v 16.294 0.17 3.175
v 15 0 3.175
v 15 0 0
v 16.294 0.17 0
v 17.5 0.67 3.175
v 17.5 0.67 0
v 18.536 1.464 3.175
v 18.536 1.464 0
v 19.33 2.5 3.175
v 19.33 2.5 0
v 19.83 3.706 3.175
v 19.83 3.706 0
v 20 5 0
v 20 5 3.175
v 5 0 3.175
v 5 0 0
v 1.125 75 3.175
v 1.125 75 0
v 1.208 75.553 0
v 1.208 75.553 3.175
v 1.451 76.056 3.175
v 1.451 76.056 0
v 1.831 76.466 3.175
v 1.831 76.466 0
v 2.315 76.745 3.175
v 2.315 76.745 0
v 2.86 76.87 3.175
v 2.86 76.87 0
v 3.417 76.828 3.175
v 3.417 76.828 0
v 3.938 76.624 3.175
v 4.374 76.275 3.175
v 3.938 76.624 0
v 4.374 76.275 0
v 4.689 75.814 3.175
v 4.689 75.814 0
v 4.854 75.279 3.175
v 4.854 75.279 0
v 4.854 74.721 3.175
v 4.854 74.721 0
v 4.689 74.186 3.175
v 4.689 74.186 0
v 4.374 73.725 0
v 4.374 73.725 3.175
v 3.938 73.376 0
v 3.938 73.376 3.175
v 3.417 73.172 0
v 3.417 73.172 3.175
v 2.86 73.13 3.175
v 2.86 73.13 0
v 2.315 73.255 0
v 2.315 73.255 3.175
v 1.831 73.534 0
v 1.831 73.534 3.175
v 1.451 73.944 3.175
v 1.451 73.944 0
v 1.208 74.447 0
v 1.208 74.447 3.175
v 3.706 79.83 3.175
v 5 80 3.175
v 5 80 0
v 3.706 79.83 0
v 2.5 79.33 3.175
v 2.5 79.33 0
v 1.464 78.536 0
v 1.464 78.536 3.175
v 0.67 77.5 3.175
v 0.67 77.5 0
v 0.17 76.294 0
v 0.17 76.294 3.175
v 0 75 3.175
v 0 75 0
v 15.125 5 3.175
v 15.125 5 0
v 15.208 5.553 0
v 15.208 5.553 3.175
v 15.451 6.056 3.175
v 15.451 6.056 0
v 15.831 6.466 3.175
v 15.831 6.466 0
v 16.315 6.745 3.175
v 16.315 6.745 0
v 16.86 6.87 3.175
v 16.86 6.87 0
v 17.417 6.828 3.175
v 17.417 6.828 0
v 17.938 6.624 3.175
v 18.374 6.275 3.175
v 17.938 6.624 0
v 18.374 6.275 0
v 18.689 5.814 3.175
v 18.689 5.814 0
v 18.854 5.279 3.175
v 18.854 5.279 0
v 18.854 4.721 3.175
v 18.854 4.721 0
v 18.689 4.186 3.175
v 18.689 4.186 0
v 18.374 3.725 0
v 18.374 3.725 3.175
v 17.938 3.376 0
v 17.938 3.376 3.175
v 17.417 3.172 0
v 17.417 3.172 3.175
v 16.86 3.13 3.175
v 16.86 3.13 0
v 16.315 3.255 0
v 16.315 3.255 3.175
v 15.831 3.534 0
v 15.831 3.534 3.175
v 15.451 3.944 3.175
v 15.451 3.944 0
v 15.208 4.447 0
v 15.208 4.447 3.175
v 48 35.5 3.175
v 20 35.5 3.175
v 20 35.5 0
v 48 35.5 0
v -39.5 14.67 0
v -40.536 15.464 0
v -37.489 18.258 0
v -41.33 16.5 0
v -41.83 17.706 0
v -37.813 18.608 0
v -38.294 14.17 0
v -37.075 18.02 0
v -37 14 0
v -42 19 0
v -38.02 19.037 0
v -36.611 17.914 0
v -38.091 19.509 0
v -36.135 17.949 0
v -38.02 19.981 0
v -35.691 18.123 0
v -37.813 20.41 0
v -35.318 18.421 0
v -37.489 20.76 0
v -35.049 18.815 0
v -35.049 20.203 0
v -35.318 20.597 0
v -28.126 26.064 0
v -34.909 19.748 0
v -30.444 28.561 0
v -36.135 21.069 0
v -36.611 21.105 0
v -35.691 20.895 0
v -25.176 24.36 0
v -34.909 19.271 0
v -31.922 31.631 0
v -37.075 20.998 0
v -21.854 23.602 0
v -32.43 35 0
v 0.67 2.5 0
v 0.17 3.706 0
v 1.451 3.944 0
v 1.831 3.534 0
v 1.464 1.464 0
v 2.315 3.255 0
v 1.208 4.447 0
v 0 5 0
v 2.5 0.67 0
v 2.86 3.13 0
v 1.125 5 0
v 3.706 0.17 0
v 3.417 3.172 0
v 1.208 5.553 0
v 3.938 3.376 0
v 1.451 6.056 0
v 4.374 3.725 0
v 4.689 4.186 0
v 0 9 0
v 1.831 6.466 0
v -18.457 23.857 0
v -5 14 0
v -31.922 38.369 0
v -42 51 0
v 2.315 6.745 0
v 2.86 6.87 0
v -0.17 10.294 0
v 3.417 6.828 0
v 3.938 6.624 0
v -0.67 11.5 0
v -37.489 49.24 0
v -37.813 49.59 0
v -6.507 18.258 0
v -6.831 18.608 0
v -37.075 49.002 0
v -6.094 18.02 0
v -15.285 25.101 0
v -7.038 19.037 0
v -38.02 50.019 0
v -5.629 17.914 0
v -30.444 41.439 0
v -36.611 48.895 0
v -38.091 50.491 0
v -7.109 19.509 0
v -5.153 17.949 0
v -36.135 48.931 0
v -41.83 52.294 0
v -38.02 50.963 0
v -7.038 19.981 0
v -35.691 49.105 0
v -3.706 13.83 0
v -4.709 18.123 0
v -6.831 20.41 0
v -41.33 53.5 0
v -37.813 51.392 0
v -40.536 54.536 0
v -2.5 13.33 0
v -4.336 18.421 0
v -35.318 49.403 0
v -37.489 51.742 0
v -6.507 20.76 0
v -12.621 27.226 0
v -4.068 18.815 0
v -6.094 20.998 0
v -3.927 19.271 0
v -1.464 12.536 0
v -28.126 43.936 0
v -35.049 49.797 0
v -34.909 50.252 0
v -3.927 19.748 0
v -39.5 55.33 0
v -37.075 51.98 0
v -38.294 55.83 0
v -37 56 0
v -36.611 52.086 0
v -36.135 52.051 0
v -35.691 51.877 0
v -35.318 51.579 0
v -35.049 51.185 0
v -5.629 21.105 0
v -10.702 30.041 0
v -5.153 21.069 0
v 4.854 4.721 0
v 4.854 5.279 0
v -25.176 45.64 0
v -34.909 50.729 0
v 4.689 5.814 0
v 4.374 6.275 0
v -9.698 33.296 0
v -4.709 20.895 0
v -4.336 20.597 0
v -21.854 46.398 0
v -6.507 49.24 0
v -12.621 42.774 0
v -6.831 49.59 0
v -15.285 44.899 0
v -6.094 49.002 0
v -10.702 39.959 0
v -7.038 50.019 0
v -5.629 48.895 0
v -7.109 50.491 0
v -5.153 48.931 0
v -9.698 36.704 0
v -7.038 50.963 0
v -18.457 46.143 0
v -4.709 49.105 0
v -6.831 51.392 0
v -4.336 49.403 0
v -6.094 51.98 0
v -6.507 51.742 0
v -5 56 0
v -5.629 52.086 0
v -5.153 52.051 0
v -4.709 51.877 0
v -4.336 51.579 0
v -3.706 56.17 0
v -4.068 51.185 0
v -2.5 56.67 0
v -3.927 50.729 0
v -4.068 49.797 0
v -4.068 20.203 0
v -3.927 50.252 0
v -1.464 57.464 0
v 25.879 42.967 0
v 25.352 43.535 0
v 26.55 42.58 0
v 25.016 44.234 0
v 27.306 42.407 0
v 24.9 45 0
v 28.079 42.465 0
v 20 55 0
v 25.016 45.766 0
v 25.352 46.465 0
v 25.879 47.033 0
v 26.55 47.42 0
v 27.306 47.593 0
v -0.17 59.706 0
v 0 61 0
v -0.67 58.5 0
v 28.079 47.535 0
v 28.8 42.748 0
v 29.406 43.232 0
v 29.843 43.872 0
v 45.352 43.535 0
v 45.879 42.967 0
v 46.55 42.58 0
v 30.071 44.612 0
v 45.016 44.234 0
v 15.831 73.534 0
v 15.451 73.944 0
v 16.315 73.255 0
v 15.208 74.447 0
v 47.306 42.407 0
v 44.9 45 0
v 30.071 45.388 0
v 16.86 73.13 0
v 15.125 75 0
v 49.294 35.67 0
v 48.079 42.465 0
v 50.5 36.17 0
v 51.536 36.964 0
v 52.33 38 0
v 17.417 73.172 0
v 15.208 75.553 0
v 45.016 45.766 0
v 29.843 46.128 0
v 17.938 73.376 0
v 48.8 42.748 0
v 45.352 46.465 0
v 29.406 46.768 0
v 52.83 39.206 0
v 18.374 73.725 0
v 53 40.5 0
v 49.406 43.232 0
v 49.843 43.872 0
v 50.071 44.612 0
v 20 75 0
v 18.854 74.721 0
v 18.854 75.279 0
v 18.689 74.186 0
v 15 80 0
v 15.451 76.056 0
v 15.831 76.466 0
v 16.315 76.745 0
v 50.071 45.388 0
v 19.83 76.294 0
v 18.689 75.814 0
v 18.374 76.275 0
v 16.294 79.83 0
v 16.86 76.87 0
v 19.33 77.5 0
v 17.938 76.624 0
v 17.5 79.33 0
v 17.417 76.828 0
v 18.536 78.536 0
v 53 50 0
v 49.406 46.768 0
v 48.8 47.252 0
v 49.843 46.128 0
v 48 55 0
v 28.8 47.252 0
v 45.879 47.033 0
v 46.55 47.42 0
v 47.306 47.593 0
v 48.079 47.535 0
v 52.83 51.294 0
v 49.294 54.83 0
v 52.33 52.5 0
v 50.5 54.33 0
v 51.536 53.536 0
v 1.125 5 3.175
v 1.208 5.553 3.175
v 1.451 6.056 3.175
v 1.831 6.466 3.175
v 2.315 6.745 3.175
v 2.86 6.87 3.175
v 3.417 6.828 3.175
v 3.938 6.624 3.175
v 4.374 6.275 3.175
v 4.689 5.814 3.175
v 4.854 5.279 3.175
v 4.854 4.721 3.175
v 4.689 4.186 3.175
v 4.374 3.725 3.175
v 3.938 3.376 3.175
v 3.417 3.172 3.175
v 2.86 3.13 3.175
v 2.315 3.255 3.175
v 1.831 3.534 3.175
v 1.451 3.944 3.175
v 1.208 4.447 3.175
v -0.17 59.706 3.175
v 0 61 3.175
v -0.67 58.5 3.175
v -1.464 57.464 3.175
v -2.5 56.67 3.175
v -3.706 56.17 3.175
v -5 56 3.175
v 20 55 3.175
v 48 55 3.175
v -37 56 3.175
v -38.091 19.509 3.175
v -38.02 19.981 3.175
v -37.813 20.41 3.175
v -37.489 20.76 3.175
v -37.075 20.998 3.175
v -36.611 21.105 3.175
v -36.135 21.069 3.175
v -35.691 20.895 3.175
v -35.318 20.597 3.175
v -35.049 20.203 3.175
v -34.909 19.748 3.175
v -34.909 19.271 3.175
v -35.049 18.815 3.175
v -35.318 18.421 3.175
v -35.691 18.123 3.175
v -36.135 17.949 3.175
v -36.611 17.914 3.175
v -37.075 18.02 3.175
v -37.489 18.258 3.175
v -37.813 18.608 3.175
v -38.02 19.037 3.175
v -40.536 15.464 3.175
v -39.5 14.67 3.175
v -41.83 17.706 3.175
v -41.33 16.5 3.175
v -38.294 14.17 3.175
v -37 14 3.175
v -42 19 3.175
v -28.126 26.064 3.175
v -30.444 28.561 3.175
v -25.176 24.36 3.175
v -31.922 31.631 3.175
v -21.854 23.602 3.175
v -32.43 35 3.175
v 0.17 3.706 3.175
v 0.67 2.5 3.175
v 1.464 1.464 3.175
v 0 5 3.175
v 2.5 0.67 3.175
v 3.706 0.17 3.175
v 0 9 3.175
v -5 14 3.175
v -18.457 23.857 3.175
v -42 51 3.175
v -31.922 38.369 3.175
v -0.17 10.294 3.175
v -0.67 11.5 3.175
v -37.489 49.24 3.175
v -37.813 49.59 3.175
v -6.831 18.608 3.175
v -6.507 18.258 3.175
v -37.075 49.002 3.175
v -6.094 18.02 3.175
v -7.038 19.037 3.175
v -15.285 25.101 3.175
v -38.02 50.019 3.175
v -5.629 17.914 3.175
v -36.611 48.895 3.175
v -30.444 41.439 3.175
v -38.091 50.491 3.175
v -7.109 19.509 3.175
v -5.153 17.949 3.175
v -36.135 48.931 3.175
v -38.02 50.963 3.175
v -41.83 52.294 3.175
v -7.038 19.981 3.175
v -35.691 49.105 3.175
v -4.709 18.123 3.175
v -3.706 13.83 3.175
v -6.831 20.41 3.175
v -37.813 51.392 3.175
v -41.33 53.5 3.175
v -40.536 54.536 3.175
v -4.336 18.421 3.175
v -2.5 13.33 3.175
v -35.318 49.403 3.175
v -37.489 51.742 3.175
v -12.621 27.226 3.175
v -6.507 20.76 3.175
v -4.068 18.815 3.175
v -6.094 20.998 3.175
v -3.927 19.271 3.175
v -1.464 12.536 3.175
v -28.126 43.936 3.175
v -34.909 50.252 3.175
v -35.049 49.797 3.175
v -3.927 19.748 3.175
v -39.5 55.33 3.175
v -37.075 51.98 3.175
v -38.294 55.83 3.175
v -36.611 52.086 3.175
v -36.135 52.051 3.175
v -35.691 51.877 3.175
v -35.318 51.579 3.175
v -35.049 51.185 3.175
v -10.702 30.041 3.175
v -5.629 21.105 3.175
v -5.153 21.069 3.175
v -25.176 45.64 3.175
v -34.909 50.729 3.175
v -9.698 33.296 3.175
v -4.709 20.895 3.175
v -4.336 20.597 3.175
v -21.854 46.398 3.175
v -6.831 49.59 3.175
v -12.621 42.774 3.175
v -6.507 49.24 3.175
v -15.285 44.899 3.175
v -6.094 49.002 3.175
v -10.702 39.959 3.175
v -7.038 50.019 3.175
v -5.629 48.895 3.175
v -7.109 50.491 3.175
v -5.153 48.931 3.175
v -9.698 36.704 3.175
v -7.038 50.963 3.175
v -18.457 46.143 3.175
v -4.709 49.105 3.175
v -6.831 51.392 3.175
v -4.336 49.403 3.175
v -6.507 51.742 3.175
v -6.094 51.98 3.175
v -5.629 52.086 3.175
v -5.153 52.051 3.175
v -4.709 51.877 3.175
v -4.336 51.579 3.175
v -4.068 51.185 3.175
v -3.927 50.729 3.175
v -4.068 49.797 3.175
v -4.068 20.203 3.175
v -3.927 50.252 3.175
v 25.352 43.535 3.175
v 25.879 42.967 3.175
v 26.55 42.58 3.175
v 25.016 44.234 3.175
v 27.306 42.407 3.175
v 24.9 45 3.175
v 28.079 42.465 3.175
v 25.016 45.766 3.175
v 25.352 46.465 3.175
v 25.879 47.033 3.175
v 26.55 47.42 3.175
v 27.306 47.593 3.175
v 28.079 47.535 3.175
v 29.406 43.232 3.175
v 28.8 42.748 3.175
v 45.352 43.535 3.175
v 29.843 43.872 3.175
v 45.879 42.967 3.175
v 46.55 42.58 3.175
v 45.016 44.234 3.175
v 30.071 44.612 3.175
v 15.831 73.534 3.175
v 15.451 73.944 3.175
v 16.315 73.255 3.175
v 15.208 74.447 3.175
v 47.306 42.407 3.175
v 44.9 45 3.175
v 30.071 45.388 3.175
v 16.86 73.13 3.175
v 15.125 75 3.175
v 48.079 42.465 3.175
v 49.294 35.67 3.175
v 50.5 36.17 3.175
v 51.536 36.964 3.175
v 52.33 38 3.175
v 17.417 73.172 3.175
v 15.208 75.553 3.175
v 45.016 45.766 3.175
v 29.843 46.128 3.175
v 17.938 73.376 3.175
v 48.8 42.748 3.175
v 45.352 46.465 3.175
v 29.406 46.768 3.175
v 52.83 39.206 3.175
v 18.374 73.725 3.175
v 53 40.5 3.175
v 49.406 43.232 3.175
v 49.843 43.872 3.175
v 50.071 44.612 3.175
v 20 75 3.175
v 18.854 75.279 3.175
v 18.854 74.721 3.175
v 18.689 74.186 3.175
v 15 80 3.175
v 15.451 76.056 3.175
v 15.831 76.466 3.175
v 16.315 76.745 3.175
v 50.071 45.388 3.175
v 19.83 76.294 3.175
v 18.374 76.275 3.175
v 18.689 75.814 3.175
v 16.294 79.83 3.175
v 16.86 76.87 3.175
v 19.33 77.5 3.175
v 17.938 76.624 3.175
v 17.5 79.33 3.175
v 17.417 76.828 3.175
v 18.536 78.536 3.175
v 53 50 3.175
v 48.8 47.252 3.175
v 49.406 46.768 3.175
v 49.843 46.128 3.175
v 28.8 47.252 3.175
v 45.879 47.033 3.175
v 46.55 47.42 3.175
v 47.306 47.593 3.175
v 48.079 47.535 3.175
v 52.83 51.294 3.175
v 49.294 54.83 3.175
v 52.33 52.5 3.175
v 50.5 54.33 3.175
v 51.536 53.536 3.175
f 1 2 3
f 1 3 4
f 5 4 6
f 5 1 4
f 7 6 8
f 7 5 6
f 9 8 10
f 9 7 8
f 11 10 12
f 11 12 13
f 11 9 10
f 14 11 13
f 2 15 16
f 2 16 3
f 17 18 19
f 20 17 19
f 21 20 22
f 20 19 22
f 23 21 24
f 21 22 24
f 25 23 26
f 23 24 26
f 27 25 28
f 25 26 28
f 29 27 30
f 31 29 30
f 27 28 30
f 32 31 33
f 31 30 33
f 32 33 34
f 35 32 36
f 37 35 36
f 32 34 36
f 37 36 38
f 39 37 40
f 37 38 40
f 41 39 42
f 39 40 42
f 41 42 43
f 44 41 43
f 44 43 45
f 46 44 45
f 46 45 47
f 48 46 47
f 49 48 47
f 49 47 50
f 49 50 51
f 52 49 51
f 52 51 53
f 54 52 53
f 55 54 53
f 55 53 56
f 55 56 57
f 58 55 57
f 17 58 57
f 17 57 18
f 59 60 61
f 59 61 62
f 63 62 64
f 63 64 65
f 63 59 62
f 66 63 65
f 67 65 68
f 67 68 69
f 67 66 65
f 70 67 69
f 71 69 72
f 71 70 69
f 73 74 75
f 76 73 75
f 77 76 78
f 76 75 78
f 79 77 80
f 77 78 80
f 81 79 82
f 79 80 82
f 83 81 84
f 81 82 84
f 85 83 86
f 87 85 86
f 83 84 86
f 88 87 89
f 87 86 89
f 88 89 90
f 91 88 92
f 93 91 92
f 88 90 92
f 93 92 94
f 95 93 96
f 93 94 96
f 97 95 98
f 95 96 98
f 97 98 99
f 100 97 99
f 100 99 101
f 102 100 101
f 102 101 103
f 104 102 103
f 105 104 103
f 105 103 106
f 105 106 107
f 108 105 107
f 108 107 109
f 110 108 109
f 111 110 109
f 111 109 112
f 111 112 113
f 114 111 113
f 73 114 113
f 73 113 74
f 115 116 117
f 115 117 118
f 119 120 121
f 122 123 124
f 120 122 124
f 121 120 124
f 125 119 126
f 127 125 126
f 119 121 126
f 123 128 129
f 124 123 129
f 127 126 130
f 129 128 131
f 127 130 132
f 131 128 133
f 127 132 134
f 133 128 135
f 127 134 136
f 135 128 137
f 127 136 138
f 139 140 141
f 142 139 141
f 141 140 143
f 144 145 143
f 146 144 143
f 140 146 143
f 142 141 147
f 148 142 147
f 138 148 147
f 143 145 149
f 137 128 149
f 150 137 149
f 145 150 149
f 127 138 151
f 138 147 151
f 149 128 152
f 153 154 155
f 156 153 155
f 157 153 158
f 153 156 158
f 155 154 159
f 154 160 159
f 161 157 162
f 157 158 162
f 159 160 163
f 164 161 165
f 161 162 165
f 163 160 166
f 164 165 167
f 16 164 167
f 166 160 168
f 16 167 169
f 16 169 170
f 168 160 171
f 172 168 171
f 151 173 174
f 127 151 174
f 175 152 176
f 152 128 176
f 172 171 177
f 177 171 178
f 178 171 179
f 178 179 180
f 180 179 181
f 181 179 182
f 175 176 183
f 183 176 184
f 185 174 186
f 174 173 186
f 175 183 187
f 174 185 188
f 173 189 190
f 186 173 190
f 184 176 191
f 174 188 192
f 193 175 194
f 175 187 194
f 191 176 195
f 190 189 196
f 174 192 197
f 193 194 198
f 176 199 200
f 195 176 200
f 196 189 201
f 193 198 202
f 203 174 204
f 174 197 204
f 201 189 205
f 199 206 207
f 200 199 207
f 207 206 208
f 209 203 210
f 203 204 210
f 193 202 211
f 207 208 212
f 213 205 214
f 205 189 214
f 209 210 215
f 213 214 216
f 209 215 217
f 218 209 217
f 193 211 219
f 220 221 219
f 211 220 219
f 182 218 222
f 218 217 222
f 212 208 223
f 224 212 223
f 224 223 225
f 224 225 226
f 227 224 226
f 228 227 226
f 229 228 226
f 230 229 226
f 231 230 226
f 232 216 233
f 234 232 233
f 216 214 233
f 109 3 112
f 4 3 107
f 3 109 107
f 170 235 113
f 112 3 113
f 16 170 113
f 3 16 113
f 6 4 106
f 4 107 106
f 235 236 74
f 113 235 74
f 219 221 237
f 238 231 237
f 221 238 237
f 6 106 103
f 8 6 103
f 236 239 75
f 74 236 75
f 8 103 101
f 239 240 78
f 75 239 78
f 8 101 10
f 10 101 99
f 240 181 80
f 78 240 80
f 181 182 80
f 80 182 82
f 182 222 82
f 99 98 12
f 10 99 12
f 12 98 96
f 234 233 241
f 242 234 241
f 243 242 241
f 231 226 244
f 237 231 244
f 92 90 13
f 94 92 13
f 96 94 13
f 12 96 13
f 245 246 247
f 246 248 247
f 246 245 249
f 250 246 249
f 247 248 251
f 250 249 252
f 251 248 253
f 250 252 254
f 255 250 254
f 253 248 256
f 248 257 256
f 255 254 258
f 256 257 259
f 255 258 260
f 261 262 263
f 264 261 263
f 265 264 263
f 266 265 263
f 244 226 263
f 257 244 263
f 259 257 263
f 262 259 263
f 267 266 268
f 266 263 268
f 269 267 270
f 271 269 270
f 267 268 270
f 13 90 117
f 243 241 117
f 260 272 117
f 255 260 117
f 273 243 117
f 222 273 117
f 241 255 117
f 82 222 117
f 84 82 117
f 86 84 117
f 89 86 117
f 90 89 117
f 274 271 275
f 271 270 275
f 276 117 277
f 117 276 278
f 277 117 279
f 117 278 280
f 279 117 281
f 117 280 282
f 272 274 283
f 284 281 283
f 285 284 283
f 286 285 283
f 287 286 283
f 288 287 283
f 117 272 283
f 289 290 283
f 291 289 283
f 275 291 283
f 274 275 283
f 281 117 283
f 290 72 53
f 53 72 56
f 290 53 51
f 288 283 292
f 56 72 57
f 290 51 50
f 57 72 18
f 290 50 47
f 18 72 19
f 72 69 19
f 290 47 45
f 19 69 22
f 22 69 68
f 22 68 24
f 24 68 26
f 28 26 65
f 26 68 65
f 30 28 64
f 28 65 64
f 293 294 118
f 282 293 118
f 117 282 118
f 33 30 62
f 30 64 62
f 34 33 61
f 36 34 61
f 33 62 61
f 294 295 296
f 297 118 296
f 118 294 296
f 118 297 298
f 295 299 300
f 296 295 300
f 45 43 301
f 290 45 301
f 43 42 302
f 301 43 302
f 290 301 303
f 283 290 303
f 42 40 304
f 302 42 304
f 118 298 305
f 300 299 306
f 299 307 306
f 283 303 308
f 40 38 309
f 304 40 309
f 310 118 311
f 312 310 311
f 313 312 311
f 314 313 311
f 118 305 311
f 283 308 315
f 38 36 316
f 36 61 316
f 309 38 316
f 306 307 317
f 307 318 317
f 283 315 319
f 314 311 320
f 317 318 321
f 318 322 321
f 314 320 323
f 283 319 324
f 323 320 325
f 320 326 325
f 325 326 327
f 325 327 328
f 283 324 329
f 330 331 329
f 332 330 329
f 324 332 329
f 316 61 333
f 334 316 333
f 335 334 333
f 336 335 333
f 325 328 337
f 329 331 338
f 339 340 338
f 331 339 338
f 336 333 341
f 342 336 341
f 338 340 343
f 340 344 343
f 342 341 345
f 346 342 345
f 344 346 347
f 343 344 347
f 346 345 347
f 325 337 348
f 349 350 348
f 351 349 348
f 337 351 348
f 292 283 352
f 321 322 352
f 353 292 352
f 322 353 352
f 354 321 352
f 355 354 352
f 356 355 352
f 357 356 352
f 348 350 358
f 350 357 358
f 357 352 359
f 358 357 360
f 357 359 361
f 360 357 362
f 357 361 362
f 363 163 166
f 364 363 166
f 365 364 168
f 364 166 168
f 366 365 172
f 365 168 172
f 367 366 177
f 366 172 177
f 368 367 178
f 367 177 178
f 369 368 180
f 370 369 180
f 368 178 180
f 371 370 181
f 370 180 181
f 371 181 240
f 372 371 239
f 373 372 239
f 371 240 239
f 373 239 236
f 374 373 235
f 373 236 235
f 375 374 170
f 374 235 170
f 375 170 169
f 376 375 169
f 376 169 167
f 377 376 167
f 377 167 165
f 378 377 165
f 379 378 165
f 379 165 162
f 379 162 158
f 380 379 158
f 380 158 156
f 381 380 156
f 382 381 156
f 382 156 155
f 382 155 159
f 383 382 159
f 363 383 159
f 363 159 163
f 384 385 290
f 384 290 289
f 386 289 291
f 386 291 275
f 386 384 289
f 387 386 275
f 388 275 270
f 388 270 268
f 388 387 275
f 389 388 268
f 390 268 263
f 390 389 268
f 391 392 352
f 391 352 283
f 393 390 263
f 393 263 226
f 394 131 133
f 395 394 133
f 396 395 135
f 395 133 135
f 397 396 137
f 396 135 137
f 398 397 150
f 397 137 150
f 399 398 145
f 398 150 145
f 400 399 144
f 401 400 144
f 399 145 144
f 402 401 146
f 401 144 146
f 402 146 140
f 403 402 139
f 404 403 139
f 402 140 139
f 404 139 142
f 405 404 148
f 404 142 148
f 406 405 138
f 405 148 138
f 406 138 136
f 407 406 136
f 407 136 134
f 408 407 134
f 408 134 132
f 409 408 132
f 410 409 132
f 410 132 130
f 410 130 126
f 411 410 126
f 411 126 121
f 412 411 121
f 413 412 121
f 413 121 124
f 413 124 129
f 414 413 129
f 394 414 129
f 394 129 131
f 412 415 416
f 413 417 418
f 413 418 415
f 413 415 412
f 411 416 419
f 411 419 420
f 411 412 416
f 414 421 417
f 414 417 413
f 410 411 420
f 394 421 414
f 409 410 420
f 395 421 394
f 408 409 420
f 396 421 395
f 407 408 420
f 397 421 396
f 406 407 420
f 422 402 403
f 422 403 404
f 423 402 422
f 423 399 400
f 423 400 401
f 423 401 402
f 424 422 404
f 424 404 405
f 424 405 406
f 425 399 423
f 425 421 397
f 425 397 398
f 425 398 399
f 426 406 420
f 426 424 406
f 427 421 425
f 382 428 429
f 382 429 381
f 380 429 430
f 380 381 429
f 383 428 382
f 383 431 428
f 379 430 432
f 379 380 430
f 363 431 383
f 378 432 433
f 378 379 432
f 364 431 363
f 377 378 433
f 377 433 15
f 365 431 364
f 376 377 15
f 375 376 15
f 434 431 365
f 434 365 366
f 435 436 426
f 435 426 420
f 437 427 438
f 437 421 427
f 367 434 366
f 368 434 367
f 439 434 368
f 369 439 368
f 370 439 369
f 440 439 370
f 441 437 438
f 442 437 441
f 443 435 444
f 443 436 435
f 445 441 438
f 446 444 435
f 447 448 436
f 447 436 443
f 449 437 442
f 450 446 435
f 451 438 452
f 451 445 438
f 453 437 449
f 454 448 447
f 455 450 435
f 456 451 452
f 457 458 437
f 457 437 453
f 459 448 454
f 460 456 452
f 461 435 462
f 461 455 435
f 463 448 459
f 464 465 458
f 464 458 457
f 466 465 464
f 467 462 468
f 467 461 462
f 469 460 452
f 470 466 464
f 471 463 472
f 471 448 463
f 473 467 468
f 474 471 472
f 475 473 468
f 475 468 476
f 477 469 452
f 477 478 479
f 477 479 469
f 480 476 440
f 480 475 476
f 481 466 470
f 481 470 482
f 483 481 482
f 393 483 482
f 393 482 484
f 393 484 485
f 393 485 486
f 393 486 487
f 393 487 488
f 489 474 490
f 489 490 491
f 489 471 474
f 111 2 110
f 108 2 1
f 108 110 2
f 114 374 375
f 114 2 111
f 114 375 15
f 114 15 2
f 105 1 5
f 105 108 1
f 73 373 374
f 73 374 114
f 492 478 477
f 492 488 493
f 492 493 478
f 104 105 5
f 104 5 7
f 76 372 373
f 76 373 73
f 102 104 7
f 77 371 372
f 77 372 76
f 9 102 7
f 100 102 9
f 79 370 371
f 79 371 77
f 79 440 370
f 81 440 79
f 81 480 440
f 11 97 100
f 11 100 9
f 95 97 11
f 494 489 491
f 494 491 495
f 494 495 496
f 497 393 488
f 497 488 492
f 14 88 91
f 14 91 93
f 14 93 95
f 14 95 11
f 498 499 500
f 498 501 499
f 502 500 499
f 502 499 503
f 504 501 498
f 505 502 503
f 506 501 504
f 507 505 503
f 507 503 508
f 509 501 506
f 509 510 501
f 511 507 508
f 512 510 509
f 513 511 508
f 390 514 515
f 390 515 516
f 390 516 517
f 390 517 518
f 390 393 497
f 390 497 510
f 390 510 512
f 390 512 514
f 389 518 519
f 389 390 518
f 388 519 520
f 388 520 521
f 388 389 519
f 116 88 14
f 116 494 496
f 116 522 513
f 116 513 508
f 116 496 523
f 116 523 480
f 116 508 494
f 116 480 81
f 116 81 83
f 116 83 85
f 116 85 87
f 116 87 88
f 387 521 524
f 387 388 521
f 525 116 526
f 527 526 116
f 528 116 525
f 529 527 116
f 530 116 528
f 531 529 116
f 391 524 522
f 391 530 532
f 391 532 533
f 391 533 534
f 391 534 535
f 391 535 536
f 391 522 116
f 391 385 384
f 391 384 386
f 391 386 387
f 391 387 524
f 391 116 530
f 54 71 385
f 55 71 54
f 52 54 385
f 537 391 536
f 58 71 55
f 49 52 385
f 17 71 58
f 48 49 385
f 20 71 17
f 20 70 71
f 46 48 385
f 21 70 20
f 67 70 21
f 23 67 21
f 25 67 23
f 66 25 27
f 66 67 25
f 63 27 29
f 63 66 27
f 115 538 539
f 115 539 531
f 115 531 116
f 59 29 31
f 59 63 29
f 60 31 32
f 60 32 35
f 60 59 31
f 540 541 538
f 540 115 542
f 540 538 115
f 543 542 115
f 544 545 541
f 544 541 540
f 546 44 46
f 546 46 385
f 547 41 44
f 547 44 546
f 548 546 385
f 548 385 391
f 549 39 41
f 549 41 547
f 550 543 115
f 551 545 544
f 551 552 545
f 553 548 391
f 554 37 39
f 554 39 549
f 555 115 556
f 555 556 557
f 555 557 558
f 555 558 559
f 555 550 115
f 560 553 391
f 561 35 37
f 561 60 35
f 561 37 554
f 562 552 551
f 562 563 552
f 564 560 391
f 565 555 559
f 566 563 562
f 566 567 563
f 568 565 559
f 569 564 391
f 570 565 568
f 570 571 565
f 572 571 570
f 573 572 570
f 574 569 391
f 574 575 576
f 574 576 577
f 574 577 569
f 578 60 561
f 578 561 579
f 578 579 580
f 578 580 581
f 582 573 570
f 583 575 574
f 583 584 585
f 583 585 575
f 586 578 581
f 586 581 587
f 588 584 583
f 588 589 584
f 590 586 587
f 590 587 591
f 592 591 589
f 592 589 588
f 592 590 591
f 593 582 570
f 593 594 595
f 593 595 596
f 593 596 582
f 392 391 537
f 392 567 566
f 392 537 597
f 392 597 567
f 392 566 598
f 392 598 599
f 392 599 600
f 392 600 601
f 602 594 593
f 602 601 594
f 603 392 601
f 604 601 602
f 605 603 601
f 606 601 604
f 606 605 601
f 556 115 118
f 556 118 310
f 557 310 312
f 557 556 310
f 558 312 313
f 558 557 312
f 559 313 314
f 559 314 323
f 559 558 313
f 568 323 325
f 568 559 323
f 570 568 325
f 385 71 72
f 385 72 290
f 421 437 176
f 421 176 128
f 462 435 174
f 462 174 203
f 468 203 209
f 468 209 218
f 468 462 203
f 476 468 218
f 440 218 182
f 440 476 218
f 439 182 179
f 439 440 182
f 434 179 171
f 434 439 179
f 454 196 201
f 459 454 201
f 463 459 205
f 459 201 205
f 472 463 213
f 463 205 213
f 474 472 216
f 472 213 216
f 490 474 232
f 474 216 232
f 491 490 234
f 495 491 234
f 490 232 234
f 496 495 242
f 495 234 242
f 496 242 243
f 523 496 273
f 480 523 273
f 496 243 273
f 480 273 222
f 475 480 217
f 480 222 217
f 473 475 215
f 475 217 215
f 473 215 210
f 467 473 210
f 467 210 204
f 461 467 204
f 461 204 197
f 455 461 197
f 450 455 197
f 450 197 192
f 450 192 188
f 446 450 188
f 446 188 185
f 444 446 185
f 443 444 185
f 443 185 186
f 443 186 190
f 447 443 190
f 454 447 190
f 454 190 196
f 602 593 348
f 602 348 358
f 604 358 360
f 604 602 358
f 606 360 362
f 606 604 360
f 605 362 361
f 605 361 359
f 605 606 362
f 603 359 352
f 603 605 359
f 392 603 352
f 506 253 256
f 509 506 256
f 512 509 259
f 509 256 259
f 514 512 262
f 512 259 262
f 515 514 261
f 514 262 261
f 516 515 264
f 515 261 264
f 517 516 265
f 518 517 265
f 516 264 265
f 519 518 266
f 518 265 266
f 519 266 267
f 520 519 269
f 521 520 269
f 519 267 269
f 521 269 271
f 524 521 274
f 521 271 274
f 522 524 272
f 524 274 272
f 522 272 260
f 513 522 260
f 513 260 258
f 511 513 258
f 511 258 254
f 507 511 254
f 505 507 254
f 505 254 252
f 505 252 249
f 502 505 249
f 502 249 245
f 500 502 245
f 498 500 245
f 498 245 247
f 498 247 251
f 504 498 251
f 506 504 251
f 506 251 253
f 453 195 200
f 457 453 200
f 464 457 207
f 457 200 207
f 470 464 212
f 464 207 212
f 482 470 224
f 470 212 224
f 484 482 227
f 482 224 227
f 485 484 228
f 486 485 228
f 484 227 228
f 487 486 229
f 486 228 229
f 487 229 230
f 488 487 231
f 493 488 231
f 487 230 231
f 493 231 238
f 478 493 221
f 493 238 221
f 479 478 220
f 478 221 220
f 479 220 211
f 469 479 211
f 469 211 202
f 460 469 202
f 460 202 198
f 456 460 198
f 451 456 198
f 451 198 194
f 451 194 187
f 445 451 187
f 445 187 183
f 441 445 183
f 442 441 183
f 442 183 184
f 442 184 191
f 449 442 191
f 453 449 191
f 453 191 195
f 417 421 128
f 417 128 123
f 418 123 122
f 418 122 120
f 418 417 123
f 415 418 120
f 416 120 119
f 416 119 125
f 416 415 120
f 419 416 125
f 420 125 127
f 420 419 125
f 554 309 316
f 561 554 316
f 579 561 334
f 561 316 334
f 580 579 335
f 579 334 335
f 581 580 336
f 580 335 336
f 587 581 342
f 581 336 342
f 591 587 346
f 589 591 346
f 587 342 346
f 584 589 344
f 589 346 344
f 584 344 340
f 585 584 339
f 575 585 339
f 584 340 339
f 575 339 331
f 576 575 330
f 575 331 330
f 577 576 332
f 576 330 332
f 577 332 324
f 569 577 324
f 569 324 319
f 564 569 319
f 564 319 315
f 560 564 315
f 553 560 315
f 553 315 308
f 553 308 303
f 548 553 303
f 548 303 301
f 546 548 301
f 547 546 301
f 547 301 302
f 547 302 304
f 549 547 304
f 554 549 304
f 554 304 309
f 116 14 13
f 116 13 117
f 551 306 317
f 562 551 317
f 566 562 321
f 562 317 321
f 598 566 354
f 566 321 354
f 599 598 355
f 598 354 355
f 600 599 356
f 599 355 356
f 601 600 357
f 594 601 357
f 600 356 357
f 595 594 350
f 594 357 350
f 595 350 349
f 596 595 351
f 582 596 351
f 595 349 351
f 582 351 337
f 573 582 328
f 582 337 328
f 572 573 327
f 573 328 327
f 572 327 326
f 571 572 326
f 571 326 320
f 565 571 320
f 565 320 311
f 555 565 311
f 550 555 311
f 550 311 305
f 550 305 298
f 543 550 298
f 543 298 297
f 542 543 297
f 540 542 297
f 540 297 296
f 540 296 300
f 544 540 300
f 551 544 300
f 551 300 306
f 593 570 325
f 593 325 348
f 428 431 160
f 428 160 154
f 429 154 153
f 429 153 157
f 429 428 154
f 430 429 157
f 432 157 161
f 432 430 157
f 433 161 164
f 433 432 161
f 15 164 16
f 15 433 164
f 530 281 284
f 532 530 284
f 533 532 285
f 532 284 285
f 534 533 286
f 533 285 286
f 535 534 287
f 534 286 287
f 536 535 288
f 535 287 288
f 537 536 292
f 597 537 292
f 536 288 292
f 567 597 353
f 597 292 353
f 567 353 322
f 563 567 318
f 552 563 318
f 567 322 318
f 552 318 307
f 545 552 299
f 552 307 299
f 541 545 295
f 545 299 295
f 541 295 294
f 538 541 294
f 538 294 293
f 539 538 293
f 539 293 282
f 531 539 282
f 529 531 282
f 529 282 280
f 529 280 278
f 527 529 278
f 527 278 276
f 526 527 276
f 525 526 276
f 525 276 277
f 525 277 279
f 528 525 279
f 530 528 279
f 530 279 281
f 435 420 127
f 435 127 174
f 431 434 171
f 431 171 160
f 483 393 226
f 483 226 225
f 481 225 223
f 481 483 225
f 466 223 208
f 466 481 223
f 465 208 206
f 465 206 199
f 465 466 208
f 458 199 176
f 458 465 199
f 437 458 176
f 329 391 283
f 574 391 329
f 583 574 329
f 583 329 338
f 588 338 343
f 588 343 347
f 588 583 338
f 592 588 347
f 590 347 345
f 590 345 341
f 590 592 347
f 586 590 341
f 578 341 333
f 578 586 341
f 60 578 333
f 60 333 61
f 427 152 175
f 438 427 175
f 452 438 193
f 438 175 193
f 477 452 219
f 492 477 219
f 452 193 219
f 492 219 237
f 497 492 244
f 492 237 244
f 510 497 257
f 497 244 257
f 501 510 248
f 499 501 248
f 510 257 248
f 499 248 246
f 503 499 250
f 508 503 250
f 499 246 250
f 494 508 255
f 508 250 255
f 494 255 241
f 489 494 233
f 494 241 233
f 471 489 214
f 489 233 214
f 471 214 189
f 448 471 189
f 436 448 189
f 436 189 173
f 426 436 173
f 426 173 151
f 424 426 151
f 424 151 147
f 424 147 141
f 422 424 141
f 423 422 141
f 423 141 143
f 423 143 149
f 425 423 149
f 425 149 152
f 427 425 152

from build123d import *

# Parameters (mm, degrees)
BASE_FLANGE1_DEPTH         = 3.175
M3_5_CLEARANCE_HOLE1_D     = 3.75
F_5_2_5_2_DIAMETER_HOLE1_D = 5.2
F_3_2_3_2_DIAMETER_HOLE1_D = 3.2
M20_CLEARANCE_HOLE1_D      = 22.86


# Sheet-metal steps are written as plain solids
with BuildPart() as part:
    # Sketch11 → Base-Flange1 (new body)
    with BuildSketch(Plane.XY.offset(3.175)):
        with BuildLine():
            Line((-42, 51), (-42, 19))
            ThreePointArc((-42, 19), (-40.535533906, 15.464466094), (-37, 14))
            Line((-37, 14), (-5, 14))
            ThreePointArc((-5, 14), (-1.464466094, 12.535533906), (0, 9))
            Line((0, 9), (0, 5))
            ThreePointArc((0, 5), (1.464466094, 1.464466094), (5, 0))
            Line((5, 0), (15, 0))
            ThreePointArc((15, 0), (18.535533906, 1.464466094), (20, 5))
            Line((20, 5), (20, 35.499999523))
            Line((20, 35.499999523), (48, 35.499999523))
            ThreePointArc((48, 35.499999523), (51.535533906, 36.964465617), (53, 40.499999523))
            Line((53, 40.499999523), (53, 50))
            ThreePointArc((53, 50), (51.535533906, 53.535533906), (48, 55))
            Line((48, 55), (20, 55))
            Line((20, 55), (20, 75))
            ThreePointArc((20, 75), (18.535533906, 78.535533906), (15, 80))
            Line((15, 80), (5, 80))
            ThreePointArc((5, 80), (1.464466094, 78.535533906), (0, 75))
            Line((0, 75), (0, 61))
            ThreePointArc((0, 61), (-1.464466094, 57.464466094), (-5, 56))
            Line((-5, 56), (-37, 56))
            ThreePointArc((-37, 56), (-40.535533906, 54.535533906), (-42, 51))
        make_face()
    extrude(amount=-BASE_FLANGE1_DEPTH)

    # M3.5 Clearance Hole1 (through all)
    with Locations(Plane.XY.offset(3.175)):
        with Locations((17, 75), (3, 5), (3, 75), (17, 5)):
            Hole(M3_5_CLEARANCE_HOLE1_D / 2)

    # Ø5.2 (5.2) Diameter Hole1 (through all)
    with Locations(Plane.XY.offset(3.175)):
        with Locations((47.5, 45), (27.5, 45)):
            Hole(F_5_2_5_2_DIAMETER_HOLE1_D / 2)

    # Ø3.2 (3.2) Diameter Hole1 (through all)
    with Locations(Plane.XY.offset(3.175)):
        with Locations((-36.490941809, 50.490941809), (-5.509058191, 50.490941809), (-5.509058191, 19.509058191), (-36.490941809, 19.509058191)):
            Hole(F_3_2_3_2_DIAMETER_HOLE1_D / 2)

    # M20 Clearance Hole1 (through all)
    with Locations(Plane.XY.offset(3.175)):
        with Locations((-21, 35)):
            Hole(M20_CLEARANCE_HOLE1_D / 2)


solid = part.part
